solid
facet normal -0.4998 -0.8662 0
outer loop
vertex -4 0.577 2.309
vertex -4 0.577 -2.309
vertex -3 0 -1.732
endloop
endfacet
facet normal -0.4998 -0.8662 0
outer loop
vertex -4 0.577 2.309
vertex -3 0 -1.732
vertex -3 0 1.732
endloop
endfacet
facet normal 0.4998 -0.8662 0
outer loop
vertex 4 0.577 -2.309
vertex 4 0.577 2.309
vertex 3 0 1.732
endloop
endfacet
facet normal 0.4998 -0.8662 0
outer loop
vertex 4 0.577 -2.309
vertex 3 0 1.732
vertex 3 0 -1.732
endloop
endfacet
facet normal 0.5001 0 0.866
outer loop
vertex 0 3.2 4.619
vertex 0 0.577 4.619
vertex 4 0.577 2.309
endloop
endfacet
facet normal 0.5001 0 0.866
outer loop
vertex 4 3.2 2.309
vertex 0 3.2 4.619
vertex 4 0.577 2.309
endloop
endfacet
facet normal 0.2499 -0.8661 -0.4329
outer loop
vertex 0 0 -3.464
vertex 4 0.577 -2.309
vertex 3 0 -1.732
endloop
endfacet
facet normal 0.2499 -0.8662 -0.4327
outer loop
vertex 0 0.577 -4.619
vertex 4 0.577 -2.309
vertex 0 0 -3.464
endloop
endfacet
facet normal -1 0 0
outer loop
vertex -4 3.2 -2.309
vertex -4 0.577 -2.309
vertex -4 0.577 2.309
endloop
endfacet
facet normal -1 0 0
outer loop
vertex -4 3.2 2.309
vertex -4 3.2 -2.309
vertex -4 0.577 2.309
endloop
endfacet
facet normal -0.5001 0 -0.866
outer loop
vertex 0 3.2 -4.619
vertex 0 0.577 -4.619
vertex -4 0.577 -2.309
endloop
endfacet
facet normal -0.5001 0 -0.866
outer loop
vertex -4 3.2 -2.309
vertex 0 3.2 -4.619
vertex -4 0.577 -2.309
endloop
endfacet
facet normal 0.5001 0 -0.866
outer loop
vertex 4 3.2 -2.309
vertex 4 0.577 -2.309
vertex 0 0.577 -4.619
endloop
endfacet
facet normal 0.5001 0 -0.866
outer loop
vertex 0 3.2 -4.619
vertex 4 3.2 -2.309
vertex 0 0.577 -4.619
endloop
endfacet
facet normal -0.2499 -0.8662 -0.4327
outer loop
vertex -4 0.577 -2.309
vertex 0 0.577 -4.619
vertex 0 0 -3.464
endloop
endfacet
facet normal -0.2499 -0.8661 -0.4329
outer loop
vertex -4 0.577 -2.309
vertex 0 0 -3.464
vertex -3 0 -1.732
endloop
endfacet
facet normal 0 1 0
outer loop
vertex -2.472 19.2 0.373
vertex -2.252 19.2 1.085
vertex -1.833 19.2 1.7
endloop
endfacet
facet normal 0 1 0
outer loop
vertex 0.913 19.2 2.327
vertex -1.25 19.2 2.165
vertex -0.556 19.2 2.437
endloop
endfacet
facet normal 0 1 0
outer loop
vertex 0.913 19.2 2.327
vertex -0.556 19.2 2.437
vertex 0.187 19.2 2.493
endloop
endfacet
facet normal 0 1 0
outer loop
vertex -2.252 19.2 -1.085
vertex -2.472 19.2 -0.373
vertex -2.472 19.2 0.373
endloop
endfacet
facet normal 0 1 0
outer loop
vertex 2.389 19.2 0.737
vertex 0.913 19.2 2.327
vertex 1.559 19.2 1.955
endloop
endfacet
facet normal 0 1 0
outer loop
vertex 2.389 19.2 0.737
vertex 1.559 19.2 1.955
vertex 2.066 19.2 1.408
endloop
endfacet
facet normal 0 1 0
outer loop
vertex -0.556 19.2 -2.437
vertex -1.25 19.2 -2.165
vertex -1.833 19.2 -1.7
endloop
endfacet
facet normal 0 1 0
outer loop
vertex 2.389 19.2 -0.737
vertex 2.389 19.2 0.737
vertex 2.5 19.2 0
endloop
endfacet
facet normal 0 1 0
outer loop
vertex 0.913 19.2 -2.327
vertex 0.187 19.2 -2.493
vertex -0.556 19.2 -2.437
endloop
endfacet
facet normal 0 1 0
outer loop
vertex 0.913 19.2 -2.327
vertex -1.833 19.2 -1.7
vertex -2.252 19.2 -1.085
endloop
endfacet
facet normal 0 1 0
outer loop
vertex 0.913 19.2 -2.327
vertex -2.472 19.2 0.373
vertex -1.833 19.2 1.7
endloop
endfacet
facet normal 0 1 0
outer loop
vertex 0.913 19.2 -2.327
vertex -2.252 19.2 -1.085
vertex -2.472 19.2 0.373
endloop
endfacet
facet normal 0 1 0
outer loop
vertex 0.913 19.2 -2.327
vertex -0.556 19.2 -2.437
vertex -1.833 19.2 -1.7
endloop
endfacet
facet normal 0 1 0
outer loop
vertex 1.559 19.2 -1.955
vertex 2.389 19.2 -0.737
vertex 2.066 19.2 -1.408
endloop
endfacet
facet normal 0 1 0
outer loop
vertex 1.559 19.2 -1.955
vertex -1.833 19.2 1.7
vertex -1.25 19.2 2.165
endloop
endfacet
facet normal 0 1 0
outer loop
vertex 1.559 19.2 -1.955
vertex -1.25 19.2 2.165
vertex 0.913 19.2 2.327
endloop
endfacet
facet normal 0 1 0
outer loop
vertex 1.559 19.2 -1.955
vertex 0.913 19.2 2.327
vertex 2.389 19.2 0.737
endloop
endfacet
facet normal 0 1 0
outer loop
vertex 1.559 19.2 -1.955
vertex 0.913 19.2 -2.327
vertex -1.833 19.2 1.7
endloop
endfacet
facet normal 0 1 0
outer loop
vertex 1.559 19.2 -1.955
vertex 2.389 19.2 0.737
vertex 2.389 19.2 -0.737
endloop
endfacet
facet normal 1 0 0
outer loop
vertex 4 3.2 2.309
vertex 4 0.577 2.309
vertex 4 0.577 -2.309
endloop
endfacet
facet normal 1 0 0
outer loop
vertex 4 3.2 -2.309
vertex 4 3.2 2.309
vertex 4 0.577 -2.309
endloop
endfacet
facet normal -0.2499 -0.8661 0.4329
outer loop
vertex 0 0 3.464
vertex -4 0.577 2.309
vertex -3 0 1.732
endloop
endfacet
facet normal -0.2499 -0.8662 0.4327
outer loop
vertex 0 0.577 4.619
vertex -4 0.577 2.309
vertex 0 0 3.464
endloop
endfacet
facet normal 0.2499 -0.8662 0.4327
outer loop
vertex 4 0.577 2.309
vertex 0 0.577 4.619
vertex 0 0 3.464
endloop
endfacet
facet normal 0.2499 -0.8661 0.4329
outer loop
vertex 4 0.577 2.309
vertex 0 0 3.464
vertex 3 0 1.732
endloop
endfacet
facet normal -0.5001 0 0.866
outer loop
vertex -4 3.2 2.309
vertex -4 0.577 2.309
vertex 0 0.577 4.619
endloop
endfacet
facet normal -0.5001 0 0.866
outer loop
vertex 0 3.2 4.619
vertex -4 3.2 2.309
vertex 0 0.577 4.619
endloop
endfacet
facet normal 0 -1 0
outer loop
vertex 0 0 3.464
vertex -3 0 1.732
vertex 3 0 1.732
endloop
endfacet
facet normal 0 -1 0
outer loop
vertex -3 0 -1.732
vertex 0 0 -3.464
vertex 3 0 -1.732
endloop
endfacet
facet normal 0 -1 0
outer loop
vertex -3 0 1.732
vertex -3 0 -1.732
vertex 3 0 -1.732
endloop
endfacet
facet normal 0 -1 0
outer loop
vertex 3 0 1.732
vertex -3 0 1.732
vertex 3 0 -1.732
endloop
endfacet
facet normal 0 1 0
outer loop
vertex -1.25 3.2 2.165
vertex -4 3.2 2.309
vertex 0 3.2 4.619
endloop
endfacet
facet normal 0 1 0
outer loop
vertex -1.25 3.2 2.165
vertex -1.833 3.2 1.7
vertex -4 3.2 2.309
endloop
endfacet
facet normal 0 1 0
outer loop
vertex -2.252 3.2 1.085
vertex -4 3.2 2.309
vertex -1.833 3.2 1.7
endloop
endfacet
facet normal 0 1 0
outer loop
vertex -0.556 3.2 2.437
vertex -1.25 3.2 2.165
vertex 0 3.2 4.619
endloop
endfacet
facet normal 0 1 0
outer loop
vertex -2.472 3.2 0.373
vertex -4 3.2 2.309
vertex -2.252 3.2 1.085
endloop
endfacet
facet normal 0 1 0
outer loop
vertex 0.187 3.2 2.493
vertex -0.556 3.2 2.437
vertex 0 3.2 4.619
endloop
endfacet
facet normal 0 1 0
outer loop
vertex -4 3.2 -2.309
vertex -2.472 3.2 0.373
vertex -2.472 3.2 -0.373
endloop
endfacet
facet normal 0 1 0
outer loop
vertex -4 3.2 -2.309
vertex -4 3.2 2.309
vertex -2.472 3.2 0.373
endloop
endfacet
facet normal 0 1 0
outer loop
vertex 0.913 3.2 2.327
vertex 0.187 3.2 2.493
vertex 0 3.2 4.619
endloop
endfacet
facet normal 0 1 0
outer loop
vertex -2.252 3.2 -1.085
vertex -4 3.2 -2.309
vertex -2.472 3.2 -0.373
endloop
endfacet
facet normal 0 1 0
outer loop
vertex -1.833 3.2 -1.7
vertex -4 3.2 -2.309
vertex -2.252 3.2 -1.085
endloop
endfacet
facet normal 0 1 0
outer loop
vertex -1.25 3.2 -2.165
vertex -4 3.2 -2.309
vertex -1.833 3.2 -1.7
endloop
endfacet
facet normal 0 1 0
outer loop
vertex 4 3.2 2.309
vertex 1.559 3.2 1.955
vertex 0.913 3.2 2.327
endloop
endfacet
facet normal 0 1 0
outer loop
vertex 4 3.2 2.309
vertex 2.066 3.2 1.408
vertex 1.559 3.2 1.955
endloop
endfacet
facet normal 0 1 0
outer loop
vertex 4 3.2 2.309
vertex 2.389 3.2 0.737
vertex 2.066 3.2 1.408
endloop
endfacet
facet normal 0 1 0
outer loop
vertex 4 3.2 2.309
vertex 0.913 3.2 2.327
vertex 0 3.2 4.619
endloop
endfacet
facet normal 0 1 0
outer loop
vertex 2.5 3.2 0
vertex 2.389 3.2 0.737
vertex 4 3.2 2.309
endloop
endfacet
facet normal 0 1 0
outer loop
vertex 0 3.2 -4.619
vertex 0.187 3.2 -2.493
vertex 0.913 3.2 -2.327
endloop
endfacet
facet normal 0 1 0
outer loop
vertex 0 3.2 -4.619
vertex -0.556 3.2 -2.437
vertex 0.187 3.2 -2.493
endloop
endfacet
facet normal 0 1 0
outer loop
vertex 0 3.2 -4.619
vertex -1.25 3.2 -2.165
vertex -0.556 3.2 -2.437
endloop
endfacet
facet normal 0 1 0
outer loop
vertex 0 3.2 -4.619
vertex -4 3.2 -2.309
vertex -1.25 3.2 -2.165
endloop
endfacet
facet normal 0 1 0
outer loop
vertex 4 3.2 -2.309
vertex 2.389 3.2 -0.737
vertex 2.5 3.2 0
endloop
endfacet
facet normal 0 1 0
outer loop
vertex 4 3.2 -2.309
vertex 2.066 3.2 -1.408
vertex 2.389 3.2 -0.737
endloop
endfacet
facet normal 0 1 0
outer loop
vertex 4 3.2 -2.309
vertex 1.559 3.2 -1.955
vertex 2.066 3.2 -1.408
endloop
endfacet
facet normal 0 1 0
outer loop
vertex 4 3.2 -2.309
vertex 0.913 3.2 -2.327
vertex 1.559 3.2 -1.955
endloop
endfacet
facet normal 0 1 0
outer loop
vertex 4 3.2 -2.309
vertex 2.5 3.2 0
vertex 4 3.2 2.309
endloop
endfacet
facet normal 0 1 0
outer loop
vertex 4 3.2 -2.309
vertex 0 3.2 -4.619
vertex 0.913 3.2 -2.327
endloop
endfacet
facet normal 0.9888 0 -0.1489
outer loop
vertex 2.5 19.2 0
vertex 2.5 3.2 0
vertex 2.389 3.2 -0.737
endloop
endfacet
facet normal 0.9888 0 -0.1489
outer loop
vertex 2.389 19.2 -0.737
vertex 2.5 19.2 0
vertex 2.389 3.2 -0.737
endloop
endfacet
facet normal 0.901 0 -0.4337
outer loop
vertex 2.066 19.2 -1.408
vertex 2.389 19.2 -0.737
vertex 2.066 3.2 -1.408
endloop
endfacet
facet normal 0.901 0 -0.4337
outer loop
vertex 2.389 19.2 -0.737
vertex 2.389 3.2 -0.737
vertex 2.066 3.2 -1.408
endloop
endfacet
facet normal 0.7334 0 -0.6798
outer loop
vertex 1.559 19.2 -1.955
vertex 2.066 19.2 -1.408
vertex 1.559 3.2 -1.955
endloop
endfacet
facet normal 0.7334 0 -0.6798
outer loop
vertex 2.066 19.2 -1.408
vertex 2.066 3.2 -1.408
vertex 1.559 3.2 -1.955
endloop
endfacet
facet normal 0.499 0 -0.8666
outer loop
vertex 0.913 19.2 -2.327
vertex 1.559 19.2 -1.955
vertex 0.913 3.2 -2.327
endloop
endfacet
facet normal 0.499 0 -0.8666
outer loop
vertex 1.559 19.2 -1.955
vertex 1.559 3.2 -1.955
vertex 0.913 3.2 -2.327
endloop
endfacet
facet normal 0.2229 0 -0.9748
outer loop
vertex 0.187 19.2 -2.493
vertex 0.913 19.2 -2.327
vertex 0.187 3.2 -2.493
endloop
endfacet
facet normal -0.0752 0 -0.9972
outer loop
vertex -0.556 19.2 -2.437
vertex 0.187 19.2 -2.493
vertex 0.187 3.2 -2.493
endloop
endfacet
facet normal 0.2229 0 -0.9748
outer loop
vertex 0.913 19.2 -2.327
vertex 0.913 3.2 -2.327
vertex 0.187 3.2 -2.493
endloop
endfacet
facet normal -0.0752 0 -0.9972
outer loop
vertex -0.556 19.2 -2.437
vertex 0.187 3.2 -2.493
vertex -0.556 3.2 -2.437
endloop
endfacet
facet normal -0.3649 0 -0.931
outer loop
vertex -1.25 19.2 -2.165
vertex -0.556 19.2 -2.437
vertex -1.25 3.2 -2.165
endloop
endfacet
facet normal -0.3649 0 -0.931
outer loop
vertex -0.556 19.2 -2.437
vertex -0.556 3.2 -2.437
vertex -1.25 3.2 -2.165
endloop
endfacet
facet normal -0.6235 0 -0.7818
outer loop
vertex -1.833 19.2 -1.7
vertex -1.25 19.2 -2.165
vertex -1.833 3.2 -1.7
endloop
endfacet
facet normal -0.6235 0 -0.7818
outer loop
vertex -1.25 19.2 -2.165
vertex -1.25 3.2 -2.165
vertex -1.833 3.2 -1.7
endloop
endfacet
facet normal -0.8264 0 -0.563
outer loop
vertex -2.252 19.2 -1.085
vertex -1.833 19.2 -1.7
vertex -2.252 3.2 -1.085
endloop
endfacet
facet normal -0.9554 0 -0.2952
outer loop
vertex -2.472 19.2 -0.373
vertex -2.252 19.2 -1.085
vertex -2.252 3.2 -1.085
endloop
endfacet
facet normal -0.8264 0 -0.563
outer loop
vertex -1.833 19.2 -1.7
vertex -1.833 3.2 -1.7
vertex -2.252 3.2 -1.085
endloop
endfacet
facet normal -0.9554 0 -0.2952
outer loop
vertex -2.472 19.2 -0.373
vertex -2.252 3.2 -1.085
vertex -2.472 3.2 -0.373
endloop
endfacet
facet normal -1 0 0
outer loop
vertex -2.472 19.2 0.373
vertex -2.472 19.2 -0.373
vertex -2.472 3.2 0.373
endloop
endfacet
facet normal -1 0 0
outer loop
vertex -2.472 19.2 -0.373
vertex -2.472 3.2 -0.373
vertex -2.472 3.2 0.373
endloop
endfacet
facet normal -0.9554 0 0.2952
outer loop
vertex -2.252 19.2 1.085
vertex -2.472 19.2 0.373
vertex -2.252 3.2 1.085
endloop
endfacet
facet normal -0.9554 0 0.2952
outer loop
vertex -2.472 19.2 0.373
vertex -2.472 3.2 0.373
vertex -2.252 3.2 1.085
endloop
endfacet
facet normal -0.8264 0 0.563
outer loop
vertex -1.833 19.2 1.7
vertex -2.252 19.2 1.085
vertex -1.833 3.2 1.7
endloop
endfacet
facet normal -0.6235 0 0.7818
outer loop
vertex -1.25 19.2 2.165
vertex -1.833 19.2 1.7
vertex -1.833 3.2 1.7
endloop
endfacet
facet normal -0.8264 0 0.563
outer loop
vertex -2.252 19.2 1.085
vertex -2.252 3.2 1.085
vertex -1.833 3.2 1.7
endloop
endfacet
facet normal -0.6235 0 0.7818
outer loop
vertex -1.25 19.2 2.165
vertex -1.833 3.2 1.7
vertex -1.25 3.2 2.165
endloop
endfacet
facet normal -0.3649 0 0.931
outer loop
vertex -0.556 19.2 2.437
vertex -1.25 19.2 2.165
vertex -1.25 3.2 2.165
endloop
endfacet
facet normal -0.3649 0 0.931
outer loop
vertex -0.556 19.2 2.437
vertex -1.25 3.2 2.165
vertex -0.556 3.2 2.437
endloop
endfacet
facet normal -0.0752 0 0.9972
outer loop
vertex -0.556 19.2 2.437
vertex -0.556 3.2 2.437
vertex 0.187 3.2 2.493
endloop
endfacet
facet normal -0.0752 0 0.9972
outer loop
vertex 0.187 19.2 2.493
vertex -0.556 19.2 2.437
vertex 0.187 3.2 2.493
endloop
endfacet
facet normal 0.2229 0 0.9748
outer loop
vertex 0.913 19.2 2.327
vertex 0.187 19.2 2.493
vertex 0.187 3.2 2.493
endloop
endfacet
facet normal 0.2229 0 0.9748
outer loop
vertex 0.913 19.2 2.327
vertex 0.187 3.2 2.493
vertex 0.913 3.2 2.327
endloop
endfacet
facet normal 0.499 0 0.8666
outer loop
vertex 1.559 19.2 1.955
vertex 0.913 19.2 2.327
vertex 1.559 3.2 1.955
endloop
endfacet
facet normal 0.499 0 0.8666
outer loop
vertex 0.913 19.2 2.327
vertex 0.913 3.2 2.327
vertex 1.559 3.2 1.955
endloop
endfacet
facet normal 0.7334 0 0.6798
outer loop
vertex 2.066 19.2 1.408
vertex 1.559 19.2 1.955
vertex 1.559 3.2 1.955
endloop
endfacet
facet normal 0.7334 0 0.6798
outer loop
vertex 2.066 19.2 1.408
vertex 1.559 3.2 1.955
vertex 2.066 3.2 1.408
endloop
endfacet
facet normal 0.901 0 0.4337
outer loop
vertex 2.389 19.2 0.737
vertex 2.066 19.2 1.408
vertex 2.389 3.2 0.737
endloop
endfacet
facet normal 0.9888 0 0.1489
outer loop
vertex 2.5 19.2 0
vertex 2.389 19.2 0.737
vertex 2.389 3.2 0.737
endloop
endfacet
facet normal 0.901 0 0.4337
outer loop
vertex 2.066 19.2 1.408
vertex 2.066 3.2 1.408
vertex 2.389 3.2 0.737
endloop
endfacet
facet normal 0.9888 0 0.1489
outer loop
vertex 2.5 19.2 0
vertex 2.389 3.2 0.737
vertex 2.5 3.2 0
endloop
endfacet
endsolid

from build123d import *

# Parameters (mm, degrees)
EXTRUDE_1_DEPTH = 3.2
SKETCH_2_R      = 2.5
EXTRUDE_2_DEPTH = 16
CHAMFER_1_SIZE  = 1
CHAMFER_1_SIZE2 = 0.577350269


with BuildPart() as part:
    # Эскиз1 → Бобышка-Вытянуть1 (new body)
    with BuildSketch(Plane(origin=(0, 0, 0), x_dir=(1, 0, 0), z_dir=(0, 1, 0))):
        Polygon((4, -2.309401077), (4, 2.309401077), (0, 4.618802154), (-4, 2.309401077), (-4, -2.309401077), (0, -4.618802154), align=None)
    extrude(amount=EXTRUDE_1_DEPTH)

    # Эскиз2 → Бобышка-Вытянуть2 (add)
    with BuildSketch(Plane(origin=(0, 3.2, 0), x_dir=(1, 0, 0), z_dir=(0, 1, 0))):
        Circle(SKETCH_2_R)
    extrude(amount=EXTRUDE_2_DEPTH)

    # Фаска1
    chamfer_1_edges = [part.edges().sort_by_distance(p)[0] for p in [
        (-2, 0, 3.464101615),
        (-4, 0, 0),
        (-2, 0, -3.464101615),
        (2, 0, -3.464101615),
        (4, 0, 0),
        (2, 0, 3.464101615),
    ]]
    chamfer_1_side = [part.faces().sort_by_distance(p)[0] for p in [
        (0, 0, 0),
    ]]
    chamfer(chamfer_1_edges, length=CHAMFER_1_SIZE, length2=CHAMFER_1_SIZE2, reference=chamfer_1_side[0])


solid = part.part
